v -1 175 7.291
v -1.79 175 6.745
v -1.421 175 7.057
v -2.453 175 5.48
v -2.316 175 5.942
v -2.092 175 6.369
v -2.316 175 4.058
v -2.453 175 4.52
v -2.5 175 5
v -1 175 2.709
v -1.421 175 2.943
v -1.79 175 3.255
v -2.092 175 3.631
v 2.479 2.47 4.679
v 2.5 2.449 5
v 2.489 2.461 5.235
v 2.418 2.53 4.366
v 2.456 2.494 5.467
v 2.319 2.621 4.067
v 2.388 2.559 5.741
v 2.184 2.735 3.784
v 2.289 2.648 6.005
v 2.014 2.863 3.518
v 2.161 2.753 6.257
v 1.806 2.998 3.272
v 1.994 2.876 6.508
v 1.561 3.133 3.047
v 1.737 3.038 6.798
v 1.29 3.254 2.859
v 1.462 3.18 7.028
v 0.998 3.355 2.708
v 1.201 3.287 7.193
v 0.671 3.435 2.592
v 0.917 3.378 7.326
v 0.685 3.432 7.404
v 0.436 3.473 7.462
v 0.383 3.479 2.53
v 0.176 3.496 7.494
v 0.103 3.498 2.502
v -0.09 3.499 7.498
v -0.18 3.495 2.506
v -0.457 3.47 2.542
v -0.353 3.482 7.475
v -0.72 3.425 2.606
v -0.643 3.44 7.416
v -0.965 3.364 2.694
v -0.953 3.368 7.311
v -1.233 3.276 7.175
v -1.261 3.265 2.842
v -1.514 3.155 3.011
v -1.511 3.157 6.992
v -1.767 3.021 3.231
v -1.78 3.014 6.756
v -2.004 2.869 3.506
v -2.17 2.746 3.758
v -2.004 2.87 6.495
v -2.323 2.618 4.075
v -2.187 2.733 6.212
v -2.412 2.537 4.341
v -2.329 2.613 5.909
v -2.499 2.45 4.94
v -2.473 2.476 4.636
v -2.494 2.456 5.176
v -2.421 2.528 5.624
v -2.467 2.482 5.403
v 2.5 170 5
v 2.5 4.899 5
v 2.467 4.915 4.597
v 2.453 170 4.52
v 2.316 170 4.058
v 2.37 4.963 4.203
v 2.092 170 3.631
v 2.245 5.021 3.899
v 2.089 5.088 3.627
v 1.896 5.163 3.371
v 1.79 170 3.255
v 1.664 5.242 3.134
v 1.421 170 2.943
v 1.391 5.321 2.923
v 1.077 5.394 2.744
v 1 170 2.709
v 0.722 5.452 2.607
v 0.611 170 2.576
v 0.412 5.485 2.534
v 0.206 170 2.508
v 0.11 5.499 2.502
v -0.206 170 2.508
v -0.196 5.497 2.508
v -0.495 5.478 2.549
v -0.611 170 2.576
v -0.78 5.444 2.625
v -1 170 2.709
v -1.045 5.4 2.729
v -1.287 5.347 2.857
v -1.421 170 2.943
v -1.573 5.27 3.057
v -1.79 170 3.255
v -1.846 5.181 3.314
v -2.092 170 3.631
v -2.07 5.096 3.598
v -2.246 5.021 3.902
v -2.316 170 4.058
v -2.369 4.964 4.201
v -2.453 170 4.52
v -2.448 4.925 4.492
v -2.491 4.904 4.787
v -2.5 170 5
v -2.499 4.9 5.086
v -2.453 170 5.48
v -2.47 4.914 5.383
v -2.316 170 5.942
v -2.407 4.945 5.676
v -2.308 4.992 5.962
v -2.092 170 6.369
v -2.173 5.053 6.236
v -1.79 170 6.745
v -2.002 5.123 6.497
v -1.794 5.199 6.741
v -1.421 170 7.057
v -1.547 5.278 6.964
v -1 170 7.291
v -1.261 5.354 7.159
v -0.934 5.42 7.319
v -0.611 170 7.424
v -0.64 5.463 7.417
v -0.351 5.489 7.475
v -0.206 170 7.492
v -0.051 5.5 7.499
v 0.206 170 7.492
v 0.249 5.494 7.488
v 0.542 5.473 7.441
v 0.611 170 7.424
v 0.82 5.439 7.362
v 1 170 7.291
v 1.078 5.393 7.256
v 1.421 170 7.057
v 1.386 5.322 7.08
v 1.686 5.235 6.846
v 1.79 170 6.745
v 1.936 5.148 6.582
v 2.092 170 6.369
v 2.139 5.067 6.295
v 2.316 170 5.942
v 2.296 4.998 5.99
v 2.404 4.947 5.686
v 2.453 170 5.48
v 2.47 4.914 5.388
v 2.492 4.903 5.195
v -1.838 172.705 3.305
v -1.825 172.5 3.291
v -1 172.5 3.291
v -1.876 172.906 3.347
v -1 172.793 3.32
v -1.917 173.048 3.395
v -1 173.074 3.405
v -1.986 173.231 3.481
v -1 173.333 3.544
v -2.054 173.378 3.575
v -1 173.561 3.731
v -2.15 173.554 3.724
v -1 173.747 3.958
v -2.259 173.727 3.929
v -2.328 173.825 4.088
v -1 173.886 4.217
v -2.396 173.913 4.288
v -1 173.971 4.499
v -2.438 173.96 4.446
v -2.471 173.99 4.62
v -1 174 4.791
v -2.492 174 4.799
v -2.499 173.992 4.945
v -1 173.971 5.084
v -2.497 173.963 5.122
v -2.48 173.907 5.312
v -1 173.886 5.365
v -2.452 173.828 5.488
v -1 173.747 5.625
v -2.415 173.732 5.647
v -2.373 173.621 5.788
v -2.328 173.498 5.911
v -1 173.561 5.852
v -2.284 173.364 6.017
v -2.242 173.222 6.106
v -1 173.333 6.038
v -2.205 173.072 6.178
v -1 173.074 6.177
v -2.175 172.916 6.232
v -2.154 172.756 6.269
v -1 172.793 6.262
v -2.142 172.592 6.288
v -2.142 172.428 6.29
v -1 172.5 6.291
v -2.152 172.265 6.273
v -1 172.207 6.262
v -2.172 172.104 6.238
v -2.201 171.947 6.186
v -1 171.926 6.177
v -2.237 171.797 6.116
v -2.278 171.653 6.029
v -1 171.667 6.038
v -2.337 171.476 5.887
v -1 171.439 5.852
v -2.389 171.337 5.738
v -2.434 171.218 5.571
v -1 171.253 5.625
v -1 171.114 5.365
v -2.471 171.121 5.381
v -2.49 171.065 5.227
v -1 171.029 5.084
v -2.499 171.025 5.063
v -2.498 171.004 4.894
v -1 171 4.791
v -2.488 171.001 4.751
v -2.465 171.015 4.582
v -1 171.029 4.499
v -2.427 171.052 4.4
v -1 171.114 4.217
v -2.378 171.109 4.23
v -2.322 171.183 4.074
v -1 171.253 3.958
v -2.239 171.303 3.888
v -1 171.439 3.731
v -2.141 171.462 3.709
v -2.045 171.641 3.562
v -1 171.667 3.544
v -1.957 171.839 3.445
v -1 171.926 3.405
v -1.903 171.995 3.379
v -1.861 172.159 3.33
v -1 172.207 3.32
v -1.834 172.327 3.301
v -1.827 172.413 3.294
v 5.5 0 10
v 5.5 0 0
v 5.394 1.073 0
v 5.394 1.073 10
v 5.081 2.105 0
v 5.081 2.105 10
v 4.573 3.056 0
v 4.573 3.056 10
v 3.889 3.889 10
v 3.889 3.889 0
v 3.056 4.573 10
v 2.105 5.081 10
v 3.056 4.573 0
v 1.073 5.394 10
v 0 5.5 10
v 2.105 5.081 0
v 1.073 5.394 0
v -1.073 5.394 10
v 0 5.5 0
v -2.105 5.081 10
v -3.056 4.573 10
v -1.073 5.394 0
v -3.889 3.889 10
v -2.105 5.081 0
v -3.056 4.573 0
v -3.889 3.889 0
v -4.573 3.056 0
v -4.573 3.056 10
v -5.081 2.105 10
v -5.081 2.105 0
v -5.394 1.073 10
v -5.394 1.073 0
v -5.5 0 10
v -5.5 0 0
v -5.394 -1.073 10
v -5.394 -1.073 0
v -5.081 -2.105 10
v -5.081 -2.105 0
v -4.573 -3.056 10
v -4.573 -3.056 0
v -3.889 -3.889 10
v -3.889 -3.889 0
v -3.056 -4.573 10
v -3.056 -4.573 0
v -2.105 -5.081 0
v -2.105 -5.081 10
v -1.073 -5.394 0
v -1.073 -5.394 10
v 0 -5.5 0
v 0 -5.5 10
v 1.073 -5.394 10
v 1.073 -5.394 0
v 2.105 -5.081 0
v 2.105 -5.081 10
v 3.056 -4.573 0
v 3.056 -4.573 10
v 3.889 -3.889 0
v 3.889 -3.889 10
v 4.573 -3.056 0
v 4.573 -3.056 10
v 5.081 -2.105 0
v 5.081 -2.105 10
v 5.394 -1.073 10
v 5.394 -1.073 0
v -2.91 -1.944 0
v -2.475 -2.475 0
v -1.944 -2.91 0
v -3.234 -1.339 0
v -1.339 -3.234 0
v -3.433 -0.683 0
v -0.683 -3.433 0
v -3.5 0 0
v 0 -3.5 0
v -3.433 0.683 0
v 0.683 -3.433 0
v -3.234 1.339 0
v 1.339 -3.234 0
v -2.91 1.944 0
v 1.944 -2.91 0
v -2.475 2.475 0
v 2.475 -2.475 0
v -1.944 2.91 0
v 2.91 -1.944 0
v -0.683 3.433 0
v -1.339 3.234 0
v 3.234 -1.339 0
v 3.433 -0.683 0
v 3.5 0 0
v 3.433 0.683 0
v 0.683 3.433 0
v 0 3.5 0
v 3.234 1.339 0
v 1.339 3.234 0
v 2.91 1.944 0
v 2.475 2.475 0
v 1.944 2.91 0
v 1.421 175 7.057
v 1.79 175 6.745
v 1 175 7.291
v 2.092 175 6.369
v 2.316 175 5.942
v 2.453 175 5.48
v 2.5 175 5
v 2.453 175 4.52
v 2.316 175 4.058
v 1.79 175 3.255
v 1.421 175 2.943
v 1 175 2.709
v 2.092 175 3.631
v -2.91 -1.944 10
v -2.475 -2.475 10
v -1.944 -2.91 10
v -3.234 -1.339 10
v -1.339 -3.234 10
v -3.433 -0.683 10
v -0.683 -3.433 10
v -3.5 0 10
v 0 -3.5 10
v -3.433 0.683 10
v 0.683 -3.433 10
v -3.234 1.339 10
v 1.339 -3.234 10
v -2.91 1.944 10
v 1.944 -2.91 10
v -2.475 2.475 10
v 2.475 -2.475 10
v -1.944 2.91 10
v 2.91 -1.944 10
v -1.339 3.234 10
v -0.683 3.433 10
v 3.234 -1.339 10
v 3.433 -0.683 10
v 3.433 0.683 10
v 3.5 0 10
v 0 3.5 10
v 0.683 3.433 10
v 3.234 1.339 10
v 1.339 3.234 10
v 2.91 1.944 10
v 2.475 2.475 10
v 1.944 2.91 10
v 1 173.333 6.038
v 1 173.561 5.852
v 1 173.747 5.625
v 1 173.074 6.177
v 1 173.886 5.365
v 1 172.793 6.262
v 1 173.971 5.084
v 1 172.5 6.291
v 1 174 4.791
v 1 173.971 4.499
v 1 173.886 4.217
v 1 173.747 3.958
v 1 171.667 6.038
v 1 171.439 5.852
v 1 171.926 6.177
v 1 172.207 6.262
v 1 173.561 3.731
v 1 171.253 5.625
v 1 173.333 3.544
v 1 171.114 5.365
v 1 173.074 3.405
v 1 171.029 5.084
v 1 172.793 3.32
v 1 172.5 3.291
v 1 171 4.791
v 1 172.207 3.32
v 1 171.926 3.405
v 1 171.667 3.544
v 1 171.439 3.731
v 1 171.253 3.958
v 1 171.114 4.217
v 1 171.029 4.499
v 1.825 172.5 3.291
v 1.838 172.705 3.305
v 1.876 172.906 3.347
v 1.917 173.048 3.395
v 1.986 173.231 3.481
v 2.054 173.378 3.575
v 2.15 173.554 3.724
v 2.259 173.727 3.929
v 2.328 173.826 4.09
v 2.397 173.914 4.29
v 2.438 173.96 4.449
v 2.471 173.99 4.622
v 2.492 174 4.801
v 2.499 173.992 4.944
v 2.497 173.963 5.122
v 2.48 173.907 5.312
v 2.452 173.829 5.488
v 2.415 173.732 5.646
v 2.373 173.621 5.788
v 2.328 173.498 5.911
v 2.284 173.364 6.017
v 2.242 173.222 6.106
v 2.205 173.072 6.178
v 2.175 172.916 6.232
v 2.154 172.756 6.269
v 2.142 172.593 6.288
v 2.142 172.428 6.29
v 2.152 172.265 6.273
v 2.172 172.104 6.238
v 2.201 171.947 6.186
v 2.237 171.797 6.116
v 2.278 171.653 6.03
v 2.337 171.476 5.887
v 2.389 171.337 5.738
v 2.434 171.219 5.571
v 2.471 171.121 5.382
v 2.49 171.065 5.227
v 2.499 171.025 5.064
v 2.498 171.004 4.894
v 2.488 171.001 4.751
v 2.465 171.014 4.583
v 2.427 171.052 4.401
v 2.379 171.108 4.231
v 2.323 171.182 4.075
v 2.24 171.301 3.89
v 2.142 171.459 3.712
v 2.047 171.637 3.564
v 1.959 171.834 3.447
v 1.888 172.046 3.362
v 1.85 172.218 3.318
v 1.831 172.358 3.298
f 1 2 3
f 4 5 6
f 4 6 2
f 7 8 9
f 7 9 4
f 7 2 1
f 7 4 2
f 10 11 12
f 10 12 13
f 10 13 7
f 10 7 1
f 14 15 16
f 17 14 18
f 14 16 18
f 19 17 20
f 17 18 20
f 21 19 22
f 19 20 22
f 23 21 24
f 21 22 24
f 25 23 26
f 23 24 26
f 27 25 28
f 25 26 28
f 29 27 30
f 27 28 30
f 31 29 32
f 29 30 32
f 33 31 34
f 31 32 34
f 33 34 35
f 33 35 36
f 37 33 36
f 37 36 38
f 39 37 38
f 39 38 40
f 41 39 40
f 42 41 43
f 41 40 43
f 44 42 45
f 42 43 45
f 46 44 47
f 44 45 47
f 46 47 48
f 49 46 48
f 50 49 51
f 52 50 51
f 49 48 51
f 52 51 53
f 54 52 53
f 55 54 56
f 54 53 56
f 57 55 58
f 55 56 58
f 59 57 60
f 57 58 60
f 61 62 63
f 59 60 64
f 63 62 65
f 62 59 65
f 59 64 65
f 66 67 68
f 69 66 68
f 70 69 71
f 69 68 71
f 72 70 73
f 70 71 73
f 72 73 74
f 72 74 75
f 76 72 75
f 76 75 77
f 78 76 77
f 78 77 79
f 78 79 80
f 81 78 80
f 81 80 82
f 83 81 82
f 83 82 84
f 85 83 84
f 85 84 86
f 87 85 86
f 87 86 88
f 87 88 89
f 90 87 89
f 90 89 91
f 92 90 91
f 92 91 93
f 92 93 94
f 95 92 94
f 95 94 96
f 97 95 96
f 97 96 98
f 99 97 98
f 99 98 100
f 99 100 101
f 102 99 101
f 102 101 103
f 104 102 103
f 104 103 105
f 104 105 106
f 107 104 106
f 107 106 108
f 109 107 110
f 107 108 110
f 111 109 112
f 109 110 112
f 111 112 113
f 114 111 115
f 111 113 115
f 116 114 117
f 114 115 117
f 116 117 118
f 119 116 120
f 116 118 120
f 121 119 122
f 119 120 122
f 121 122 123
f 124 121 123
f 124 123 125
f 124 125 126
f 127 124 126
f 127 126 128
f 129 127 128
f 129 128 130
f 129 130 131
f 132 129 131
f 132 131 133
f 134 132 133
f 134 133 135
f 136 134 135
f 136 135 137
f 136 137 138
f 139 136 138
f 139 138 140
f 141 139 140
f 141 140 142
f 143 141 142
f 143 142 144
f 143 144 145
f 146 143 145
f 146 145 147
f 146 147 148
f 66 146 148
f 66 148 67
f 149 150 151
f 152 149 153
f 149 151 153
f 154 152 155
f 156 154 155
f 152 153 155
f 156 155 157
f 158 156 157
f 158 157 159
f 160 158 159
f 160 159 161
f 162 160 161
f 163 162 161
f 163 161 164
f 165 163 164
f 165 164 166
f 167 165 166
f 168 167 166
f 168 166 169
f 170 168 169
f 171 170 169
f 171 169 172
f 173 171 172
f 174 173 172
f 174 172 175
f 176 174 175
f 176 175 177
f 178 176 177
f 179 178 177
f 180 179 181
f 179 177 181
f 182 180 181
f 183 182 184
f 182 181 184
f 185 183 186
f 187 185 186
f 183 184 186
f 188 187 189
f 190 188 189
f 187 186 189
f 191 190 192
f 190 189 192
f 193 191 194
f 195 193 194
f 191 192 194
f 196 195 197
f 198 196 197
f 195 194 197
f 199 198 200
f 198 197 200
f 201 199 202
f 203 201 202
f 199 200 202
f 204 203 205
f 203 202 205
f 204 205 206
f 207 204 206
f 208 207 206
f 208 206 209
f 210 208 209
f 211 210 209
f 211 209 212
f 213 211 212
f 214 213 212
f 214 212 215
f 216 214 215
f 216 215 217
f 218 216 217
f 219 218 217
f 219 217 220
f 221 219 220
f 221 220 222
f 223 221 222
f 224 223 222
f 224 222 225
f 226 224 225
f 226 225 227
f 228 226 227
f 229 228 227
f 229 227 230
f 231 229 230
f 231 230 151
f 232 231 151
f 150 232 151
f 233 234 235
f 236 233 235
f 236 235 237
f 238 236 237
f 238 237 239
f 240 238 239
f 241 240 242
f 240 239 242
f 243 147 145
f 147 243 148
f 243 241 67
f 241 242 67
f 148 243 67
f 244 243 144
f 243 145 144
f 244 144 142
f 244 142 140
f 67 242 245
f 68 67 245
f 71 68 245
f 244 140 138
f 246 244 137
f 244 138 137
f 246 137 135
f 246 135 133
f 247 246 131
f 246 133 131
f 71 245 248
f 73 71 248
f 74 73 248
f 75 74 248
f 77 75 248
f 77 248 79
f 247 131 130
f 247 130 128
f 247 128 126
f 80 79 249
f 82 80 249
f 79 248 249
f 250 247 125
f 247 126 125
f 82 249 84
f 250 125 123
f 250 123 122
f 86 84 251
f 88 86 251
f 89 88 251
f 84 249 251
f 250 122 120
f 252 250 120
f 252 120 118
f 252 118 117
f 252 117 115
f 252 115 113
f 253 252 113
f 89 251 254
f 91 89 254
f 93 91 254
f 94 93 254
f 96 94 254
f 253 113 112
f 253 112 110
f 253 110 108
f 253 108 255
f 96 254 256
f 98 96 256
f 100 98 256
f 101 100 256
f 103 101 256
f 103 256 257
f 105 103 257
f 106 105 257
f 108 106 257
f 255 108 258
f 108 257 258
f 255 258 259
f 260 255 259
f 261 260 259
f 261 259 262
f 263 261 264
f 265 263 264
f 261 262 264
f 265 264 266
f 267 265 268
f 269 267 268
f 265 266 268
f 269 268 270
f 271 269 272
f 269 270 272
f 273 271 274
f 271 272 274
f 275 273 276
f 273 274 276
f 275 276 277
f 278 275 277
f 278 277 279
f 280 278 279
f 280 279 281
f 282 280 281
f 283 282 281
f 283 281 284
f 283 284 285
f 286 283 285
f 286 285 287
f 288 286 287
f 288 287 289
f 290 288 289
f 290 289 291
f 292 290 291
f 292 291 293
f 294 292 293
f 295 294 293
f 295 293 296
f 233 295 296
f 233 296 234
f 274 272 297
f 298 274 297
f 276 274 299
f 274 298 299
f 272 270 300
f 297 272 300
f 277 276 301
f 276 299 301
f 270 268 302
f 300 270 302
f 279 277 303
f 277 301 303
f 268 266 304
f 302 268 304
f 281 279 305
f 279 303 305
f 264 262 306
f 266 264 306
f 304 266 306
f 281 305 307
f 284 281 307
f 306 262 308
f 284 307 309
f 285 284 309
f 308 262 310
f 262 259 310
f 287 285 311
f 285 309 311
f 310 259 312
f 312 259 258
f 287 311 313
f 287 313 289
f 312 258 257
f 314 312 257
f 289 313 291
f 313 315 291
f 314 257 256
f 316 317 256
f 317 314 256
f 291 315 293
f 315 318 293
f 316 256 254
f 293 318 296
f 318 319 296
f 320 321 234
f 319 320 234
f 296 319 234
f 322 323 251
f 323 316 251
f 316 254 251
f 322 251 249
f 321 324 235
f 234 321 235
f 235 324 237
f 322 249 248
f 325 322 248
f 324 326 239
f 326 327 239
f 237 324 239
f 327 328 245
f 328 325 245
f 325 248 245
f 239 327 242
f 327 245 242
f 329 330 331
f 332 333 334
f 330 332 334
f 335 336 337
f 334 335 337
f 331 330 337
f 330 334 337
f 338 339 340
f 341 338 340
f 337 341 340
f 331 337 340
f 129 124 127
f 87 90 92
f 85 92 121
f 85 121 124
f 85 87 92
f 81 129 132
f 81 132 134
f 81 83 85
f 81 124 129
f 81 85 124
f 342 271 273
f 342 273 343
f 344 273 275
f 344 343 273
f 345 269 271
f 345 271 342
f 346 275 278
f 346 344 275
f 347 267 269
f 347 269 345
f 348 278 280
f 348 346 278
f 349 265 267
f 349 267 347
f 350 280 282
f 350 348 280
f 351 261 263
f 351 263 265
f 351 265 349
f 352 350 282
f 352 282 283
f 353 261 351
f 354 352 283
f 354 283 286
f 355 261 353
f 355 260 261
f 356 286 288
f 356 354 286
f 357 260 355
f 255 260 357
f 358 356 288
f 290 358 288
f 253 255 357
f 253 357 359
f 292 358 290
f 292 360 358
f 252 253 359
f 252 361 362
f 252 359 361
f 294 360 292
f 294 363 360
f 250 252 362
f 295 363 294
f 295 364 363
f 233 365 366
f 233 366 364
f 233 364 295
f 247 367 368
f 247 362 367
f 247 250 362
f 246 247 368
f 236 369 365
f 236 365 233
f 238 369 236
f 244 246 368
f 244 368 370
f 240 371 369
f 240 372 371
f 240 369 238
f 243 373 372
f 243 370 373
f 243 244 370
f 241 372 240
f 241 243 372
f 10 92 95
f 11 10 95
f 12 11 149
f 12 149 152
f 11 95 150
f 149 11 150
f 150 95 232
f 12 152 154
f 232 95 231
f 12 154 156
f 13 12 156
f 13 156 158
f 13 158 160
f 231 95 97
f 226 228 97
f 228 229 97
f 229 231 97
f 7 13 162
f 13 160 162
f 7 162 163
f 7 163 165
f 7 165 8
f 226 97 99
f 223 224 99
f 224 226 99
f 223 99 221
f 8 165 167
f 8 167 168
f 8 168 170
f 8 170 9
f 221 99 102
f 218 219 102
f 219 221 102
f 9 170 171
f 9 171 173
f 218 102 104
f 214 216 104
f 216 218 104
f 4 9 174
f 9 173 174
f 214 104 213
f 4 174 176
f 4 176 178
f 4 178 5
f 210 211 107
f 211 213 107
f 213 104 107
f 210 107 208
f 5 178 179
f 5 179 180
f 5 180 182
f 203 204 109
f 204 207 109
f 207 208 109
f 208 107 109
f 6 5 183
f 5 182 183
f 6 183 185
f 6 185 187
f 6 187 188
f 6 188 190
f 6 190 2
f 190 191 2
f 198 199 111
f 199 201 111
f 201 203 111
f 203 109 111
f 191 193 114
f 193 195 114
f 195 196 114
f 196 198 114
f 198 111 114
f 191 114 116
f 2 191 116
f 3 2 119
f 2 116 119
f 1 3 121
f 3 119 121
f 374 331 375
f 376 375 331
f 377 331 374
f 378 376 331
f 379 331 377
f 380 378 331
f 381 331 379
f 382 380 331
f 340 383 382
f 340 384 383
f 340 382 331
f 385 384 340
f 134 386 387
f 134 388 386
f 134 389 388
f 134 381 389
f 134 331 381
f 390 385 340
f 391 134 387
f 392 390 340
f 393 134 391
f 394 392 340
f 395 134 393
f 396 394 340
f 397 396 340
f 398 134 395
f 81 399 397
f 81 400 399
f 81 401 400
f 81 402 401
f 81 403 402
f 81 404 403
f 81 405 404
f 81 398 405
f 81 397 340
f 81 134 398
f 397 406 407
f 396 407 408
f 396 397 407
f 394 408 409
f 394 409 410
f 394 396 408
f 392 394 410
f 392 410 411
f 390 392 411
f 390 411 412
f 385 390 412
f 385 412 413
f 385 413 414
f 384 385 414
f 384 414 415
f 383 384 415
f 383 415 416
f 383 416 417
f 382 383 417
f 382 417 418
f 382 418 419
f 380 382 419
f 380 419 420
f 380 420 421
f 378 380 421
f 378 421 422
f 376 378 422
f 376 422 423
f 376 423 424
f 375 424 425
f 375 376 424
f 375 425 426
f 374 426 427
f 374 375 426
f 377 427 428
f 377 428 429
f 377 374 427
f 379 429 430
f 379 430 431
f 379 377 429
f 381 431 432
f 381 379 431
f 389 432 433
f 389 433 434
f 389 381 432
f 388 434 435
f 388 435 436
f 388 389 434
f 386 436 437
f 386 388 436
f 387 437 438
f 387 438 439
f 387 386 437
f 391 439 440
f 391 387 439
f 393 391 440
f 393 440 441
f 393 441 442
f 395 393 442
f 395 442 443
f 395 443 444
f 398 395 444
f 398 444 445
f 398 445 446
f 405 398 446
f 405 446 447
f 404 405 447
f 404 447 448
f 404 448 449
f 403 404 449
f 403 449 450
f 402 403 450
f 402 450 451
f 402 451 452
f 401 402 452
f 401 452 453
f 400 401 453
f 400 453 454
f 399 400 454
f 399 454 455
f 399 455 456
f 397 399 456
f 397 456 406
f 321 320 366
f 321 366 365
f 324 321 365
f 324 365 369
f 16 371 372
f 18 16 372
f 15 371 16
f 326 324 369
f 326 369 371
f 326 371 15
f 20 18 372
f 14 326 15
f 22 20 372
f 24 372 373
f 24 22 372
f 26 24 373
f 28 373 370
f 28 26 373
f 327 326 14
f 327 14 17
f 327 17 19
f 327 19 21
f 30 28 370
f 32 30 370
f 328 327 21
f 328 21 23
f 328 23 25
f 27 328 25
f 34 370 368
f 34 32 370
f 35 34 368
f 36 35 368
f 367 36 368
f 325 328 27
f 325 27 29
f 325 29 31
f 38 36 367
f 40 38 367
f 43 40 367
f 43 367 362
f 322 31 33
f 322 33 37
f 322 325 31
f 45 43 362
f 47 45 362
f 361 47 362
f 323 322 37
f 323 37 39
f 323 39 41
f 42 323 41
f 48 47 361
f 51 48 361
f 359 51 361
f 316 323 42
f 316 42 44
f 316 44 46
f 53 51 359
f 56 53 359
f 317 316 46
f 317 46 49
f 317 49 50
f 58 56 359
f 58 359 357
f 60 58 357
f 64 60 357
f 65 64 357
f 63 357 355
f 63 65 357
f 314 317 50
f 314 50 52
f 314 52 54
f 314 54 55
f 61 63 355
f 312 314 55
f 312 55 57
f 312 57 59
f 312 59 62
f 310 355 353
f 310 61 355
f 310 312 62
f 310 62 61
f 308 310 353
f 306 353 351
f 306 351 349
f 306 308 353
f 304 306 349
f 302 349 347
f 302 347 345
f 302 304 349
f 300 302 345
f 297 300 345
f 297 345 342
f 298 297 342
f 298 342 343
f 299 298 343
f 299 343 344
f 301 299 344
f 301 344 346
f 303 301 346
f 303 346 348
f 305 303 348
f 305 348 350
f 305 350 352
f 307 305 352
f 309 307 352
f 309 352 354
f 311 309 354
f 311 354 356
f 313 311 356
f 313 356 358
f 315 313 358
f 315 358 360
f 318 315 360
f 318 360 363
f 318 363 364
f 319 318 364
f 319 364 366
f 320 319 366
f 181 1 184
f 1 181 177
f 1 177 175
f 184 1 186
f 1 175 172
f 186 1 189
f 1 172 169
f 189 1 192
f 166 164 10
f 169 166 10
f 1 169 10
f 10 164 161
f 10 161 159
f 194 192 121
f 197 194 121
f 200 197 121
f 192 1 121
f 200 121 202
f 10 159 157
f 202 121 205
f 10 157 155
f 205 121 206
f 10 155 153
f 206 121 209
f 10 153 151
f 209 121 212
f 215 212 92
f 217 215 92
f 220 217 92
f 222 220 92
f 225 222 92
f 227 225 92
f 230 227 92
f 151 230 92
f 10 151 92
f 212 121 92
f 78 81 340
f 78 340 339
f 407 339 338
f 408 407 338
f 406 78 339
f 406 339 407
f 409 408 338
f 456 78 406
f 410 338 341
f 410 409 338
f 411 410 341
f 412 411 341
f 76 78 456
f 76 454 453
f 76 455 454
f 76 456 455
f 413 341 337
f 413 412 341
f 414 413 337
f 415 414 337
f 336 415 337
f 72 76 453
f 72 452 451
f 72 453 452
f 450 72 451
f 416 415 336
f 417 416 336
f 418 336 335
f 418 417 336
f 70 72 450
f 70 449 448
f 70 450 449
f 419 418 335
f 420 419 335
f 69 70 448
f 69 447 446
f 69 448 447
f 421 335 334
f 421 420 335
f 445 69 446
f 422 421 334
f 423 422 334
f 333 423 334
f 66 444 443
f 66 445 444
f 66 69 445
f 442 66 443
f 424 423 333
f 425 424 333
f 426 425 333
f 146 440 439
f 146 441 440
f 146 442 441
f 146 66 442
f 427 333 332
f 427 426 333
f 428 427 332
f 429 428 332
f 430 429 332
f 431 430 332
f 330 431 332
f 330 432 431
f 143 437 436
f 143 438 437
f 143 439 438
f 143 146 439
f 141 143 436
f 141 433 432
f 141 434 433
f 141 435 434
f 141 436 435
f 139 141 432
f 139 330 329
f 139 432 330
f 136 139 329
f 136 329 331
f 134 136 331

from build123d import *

# Parameters (mm, degrees)
SKETCH1_R               = 5.5
SKETCH1_R_2             = 3.5
BOSS_EXTRUDE1_DEPTH     = 10
SKETCH2_R               = 2.5
BOSS_EXTRUDE2_DEPTH     = 170
SKETCH3_R               = 3.5
CUT_EXTRUDE1_DEPTH      = 11
BOSS_EXTRUDE3_DEPTH     = 5
SKETCH5_R               = 1.5
CUT_EXTRUDE2_DEPTH      = 7.5
CUT_EXTRUDE2_DEPTH_BACK = 5


with BuildPart() as part:
    # Sketch1 → Boss-Extrude1 (new body)
    with BuildSketch(Plane.XY):
        Circle(SKETCH1_R)
        Circle(SKETCH1_R_2, mode=Mode.SUBTRACT)
    extrude(amount=BOSS_EXTRUDE1_DEPTH)

    # Sketch2 → Boss-Extrude2 (add)
    with BuildSketch(Plane(origin=(0, 0, 0), x_dir=(1, 0, 0), z_dir=(0, 1, 0))):
        with Locations((0, -5)):
            Circle(SKETCH2_R)
    extrude(amount=BOSS_EXTRUDE2_DEPTH)

    # Sketch3 → Cut-Extrude1 (cut, through all)
    with BuildSketch(Plane.XY.offset(10)):
        Circle(SKETCH3_R)
    extrude(amount=-CUT_EXTRUDE1_DEPTH, mode=Mode.SUBTRACT)

    # Sketch4 → Boss-Extrude3 (add)
    with BuildSketch(Plane(origin=(0, 170, 0), x_dir=(1, 0, 0), z_dir=(0, 1, 0))):
        with BuildLine():
            Line((1, -7.291288), (1, -2.708712))
            ThreePointArc((1, -2.708712), (2.5, -5), (1, -7.291288))
        make_face()
        with BuildLine():
            Line((-1, -7.291288), (-1, -2.708712))
            ThreePointArc((-1, -2.708712), (-2.5, -5), (-1, -7.291288))
        make_face()
    extrude(amount=BOSS_EXTRUDE3_DEPTH)

    # Sketch5 → Cut-Extrude2 (cut, two sides)
    with BuildSketch(Plane(origin=(-1, 0, 0), x_dir=(0, 0, -1), z_dir=(1, 0, 0))) as cut_extrude2_sk:
        with Locations((-4.791288, 172.5)):
            Circle(SKETCH5_R)
    extrude(amount=CUT_EXTRUDE2_DEPTH, mode=Mode.SUBTRACT)
    extrude(cut_extrude2_sk.sketch, amount=-CUT_EXTRUDE2_DEPTH_BACK, mode=Mode.SUBTRACT)


solid = part.part
